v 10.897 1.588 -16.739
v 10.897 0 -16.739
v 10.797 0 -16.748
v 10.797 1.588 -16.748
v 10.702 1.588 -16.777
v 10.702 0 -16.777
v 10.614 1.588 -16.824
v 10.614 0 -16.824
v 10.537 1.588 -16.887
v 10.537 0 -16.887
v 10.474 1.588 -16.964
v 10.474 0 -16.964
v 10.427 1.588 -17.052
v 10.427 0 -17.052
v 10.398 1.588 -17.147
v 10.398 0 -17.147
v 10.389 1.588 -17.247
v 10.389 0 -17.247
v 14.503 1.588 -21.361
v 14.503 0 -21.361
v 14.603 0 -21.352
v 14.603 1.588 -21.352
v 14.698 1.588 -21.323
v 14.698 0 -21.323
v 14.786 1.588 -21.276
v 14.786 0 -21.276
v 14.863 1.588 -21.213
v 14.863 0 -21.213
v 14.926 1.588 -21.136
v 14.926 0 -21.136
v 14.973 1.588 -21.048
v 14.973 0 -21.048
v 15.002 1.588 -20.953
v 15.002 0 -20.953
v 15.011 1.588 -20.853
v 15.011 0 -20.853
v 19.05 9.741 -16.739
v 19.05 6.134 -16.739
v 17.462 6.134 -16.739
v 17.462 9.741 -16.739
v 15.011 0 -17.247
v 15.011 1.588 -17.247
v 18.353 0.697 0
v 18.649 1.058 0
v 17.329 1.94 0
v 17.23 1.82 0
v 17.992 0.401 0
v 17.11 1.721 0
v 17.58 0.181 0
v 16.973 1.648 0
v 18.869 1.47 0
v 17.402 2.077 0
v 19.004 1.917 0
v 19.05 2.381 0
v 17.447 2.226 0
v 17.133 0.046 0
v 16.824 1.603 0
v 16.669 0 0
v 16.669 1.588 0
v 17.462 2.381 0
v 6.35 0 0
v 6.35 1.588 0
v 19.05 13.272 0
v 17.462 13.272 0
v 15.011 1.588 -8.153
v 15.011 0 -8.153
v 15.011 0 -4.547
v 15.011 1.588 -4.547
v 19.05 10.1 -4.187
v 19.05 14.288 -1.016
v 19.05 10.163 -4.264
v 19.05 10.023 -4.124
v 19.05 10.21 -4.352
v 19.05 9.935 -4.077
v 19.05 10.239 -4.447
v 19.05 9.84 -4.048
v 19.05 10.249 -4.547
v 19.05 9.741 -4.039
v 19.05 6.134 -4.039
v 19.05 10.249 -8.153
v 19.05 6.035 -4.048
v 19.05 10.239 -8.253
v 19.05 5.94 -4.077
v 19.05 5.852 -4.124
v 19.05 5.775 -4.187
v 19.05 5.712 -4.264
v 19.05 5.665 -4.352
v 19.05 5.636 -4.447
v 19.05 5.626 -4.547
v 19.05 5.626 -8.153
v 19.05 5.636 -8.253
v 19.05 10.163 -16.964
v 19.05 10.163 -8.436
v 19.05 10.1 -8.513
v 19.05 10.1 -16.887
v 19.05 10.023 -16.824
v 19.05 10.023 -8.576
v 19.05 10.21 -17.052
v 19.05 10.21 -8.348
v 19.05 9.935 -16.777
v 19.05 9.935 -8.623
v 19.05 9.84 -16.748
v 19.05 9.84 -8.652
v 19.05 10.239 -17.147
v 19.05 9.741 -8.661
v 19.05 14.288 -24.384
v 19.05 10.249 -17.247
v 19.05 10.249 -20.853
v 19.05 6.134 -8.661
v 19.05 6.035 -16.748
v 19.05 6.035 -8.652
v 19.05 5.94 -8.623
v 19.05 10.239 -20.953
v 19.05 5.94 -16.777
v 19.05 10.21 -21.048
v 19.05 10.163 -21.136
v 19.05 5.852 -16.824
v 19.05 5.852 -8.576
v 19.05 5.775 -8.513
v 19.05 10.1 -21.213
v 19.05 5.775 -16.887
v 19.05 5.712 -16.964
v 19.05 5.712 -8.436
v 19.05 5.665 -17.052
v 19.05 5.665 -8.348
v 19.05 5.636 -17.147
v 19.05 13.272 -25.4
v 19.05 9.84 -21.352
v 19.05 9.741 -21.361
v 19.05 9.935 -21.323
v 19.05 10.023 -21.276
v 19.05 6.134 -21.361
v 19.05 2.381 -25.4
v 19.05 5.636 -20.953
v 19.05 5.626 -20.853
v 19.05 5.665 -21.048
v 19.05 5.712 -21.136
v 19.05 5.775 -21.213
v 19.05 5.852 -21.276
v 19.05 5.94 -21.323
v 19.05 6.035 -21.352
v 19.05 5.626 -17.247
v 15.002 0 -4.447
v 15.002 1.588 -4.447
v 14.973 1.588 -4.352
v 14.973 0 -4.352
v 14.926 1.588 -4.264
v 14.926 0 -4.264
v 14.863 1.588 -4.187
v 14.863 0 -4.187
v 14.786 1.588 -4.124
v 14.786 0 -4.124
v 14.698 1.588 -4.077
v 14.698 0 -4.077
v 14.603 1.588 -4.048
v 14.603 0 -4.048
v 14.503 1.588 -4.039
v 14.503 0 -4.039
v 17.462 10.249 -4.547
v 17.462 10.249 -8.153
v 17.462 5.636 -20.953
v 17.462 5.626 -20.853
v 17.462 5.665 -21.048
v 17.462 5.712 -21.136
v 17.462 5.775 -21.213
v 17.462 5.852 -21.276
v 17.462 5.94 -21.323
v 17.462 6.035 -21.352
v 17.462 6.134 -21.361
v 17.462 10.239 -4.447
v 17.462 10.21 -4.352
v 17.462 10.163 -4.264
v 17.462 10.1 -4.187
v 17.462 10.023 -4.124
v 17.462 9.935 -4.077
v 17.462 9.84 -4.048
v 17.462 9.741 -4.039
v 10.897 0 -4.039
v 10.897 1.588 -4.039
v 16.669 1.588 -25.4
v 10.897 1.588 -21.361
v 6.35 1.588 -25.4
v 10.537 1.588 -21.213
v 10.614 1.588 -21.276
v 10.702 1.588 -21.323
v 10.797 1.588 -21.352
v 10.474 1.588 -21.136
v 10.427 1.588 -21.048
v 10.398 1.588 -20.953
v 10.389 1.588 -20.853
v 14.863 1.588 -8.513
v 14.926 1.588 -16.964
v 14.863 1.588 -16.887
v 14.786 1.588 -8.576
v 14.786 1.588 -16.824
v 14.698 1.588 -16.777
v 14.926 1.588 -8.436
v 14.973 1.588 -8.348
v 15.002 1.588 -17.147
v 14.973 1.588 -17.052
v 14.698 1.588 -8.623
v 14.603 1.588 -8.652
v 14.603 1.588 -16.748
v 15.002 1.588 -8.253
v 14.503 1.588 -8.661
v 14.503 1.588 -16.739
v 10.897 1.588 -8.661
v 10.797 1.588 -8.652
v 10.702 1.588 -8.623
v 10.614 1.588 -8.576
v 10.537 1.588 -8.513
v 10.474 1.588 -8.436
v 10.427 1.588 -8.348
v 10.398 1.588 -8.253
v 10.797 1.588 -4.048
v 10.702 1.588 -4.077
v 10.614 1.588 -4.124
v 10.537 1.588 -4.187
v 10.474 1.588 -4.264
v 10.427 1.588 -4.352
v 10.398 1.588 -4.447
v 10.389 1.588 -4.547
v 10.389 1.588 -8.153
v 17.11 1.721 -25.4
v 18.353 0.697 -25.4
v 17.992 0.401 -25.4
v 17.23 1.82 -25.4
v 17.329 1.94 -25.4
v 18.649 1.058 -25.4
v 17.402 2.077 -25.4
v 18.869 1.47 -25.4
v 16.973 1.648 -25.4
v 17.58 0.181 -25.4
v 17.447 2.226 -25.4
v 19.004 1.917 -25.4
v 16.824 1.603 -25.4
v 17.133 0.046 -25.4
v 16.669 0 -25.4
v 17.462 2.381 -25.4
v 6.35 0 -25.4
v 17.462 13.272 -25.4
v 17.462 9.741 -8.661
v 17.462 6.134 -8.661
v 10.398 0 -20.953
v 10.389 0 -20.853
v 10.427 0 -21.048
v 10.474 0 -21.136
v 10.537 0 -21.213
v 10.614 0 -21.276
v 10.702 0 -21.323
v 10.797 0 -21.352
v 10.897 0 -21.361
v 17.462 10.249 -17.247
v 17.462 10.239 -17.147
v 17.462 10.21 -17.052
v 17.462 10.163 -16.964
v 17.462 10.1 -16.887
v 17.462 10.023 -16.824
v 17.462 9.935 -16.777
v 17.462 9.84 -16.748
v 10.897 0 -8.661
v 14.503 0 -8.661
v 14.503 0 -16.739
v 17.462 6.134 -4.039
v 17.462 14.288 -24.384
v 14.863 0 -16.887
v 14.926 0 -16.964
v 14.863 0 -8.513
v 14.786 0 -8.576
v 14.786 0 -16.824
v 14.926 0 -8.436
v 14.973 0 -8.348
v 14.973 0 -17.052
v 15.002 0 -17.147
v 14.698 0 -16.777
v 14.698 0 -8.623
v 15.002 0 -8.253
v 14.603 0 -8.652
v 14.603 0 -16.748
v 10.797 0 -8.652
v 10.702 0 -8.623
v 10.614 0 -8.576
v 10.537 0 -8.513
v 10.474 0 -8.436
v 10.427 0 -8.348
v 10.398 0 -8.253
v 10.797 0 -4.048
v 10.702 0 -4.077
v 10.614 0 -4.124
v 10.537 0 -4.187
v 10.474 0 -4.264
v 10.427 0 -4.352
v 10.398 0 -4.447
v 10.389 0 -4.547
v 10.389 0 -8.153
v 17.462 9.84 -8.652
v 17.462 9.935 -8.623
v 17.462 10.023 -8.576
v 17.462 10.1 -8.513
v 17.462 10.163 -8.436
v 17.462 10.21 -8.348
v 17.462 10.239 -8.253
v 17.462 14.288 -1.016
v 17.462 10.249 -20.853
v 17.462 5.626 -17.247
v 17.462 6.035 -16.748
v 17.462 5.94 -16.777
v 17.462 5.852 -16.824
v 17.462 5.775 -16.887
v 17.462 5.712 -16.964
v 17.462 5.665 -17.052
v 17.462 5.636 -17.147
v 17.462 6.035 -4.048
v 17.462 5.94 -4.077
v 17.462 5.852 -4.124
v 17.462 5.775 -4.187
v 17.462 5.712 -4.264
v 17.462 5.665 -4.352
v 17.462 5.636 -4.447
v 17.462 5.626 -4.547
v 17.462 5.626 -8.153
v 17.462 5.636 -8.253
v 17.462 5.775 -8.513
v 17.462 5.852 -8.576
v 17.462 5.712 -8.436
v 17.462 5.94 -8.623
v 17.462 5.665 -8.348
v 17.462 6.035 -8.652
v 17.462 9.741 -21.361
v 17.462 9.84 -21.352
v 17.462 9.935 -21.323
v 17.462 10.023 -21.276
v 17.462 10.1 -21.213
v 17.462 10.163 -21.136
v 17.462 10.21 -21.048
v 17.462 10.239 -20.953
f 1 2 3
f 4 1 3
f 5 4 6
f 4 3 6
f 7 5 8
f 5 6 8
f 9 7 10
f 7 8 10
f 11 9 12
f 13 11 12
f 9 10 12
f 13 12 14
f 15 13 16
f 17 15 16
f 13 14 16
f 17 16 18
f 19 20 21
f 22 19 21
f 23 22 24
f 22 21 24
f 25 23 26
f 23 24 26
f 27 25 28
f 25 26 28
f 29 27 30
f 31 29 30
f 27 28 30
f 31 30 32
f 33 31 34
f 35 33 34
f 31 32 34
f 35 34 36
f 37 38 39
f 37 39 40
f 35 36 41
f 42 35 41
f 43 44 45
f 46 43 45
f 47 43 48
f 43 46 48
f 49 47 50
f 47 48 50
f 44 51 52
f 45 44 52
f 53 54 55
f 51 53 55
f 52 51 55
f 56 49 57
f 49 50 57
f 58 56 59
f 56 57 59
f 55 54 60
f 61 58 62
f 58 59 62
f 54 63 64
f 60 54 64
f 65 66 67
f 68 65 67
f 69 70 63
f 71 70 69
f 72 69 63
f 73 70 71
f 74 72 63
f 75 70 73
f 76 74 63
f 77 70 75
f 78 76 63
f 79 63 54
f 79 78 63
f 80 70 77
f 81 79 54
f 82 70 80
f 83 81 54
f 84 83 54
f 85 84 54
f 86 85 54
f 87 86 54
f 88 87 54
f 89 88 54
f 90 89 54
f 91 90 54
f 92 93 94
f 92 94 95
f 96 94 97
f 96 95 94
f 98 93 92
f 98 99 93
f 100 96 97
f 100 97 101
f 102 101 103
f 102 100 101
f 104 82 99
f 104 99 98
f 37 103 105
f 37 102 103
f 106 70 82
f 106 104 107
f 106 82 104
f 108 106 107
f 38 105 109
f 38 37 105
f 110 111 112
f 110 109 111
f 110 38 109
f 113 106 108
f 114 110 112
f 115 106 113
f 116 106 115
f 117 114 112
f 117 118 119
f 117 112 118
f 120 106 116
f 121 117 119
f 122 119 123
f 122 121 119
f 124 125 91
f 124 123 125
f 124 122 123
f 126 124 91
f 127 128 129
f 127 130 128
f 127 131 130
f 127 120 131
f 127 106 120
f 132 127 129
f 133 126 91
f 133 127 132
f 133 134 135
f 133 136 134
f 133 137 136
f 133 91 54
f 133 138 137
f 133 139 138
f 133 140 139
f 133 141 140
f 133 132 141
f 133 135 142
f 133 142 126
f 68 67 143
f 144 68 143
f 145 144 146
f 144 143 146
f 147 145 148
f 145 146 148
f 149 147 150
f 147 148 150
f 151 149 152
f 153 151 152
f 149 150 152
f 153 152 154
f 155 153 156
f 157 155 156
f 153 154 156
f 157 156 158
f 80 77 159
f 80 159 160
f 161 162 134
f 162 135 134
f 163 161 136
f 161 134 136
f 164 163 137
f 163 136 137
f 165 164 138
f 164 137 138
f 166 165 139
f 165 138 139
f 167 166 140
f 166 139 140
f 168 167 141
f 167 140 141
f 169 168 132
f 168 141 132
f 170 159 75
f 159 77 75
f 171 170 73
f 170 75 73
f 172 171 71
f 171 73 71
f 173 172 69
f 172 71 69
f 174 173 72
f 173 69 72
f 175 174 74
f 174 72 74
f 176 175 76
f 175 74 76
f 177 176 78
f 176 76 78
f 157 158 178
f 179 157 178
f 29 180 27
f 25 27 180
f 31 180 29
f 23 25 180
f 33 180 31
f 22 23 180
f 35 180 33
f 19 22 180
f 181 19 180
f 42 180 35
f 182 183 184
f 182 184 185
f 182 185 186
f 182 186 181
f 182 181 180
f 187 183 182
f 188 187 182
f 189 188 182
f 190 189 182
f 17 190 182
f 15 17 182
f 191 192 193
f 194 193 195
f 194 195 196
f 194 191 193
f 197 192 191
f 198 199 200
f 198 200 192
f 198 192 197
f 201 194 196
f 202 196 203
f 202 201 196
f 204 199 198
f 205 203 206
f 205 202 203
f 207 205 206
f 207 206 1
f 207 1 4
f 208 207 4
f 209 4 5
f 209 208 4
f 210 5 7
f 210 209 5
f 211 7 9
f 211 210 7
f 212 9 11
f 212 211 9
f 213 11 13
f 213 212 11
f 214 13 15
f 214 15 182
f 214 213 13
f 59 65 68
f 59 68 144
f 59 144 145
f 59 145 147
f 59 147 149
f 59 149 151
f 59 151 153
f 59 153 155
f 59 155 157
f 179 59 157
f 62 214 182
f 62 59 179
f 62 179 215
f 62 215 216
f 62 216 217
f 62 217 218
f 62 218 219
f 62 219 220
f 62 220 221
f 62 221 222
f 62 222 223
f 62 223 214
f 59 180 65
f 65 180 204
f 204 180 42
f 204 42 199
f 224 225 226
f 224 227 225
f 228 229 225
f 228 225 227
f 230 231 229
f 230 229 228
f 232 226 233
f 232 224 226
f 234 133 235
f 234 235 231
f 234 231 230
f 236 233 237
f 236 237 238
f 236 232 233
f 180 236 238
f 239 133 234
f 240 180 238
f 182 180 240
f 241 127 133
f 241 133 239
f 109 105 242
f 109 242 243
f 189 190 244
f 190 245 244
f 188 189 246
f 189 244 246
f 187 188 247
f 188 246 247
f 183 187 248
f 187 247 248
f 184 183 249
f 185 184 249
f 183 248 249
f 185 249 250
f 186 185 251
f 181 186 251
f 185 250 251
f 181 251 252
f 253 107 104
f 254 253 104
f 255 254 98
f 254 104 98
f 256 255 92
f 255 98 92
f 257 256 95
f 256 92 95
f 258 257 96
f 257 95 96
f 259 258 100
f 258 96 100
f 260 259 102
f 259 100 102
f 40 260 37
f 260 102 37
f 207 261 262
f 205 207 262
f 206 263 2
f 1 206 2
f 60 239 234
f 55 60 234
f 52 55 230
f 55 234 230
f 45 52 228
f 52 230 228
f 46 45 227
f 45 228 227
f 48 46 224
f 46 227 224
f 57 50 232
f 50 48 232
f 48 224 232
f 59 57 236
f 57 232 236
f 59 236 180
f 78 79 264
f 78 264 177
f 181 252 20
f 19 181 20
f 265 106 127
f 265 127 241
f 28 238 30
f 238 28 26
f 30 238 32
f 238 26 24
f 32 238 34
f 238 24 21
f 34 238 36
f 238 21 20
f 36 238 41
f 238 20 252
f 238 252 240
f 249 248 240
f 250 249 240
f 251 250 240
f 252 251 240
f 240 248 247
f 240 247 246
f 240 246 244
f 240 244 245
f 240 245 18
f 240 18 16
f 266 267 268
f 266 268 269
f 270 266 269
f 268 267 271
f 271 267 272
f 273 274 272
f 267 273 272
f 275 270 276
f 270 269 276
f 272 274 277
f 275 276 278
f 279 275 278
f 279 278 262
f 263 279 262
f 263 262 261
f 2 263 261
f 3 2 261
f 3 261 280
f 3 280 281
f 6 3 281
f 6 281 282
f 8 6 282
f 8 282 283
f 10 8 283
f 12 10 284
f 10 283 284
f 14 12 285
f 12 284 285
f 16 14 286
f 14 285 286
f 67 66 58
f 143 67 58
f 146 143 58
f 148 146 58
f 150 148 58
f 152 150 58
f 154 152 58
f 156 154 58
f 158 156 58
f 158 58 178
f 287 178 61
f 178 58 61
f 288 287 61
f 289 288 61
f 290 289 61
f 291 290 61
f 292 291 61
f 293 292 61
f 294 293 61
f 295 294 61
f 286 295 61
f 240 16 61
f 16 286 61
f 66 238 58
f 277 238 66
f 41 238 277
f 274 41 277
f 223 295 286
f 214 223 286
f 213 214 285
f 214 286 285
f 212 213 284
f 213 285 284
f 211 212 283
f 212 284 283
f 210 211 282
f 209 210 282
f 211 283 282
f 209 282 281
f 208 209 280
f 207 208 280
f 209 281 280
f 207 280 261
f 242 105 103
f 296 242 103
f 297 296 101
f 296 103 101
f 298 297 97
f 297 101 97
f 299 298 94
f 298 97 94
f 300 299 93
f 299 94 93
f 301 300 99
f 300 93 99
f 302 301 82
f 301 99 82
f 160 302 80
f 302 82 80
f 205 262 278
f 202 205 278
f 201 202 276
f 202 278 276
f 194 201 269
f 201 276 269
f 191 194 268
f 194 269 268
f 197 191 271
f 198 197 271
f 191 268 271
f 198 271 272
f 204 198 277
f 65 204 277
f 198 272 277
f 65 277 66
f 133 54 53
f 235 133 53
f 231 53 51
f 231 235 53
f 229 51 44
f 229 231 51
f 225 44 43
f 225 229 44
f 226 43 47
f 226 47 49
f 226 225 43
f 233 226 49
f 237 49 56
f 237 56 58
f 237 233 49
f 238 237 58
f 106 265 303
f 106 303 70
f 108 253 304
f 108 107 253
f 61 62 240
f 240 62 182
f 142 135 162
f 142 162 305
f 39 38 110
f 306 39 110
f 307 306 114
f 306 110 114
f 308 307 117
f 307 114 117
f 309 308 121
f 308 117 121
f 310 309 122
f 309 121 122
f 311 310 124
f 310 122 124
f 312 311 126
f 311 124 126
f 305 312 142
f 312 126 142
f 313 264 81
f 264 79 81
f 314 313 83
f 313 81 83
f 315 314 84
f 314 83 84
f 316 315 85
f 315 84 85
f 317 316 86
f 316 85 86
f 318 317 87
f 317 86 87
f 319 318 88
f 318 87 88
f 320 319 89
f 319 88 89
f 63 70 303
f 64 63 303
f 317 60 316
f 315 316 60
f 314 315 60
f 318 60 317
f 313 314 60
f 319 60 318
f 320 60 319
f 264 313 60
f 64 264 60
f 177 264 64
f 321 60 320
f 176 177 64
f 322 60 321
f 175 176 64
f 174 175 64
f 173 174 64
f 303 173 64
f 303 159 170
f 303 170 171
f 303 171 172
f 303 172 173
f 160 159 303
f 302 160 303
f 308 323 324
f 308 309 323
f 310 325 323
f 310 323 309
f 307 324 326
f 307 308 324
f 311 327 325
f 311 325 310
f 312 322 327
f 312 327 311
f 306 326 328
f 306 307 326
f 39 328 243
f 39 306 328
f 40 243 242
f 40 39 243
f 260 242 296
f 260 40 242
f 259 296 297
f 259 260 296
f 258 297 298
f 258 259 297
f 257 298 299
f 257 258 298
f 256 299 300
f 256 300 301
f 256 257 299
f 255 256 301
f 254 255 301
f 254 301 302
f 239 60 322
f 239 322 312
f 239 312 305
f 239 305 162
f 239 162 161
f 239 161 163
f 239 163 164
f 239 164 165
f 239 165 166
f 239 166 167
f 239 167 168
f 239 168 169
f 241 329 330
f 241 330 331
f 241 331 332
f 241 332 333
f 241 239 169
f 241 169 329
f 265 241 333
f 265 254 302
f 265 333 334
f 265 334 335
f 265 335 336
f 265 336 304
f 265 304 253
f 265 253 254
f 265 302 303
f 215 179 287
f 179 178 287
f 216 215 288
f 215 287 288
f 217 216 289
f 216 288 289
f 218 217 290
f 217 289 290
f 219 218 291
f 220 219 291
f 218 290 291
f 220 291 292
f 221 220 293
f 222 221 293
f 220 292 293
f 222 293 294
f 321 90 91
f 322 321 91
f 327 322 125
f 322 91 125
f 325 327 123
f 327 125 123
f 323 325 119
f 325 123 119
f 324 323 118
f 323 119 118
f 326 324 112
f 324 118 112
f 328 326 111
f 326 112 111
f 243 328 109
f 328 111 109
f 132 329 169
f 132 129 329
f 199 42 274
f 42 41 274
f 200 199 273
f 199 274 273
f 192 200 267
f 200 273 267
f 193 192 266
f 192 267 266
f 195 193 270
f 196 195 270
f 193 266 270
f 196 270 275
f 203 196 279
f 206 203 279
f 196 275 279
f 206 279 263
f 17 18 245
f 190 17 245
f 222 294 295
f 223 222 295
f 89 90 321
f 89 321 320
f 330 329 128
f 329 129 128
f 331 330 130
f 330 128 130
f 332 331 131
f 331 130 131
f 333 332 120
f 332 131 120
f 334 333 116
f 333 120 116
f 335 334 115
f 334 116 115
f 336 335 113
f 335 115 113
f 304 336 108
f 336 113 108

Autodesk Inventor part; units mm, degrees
ref_plane "YZ Plane" through (0, 0, 0) normal (1, 0, 0) x (0, 1, 0)
ref_plane "XZ Plane" through (0, 0, 0) normal (0, 1, 0) x (-1, 0, 0)
sketch "Sketch1" plane through (0, 0, 0) normal (0, 1, 0) x (-1, 0, 0)
  line L0 (-19.05, 0) -> (19.05, 0)
  line L1 (19.05, 0) -> (19.05, -25.4)
  line L2 (19.05, -25.4) -> (-19.05, -25.4)
  line L3 (-19.05, -25.4) -> (-19.05, 0)
  line L4 (19.05, 0) -> (-19.05, -25.4) construction
  point P0 (0, 0)
  point P1 (0, 0)
  dimension "d0" = 38.1
  dimension "d1" = 25.4
extrude "Plate1" add sketch "Sketch1" along normal blind 1.5875
sketch "Sketch2" plane through (17.4625, 0, -25.4) normal (1, 0, 0) x (0, 1, 0)
  line L0 (0, 25.4) -> (0, 0)
  line L1 (0, 0) -> (14.2875, 0)
  line L2 (14.2875, 0) -> (14.2875, 25.4)
  line L3 (14.2875, 25.4) -> (0, 25.4)
edge flange "Flanges" height 12.7 angle 90 thickness 1.5875 bend radius 0.7937 thickness toward (1, 0, 0) relief tear relief width 1.5875 relief depth 0.7937 corner gap 1.5875 corner form 0 edges at (19.05, 1.5875, -12.7) (-19.05, 1.5875, -12.7) wall of the first edge with corners at (17.4625, 0, 0) (17.4625, 0, -25.4) (17.4625, 14.2875, -25.4) (17.4625, 14.2875, 0)
bend "Bend1"
corner "Corner1"
sketch "Sketch3" plane through (19.05, 2.3813, -25.4) normal (1, 0, 0) x (0, 0, -1)
  line L0 (-20.8534, 7.8677) -> (-17.2466, 7.8677)
  line L1 (-16.7386, 7.3597) -> (-16.7386, 3.7529)
  line L2 (-17.2466, 3.2449) -> (-20.8534, 3.2449)
  line L3 (-21.3614, 3.7529) -> (-21.3614, 7.3597)
  arc A0 (-20.8534, 7.8677) -> (-21.3614, 7.3597) centre (-20.8534, 7.3597) ccw
  arc A1 (-16.7386, 7.3597) -> (-17.2466, 7.8677) centre (-17.2466, 7.3597) ccw
  arc A2 (-17.2466, 3.2449) -> (-16.7386, 3.7529) centre (-17.2466, 3.7529) ccw
  arc A3 (-21.3614, 3.7529) -> (-20.8534, 3.2449) centre (-20.8534, 3.7529) ccw
  line L4 (-25.4, 0) -> (-25.4, 11.9063) construction
  line L5 (-25.4, 11.9063) -> (0, 11.9062) construction
  line L6 (-20.8534, 7.3597) -> (-17.2466, 3.7529) construction
  point P0 (-25.4, -2.3812)
  point P1 (-16.7386, 3.2449)
  point P2 (-21.3614, 3.2449)
  point P3 (-19.05, 5.5563)
  dimension "d16" = 4.6228
  dimension "d17" = 0.508
  dimension "d20" = 6.35
  dimension "d21" = 6.35
extrude "Flange Stamp" cut sketch "Sketch3" against normal blind 1.5875
sketch "Sketch7" plane through (19.05, 2.3813, 0) normal (1, 0, 0) x (0, 0, -1)
  arc A0 (4.5466, 7.8677) -> (4.0386, 7.3597) centre (4.5466, 7.3597) ccw construction
  arc A1 (8.1534, 3.2449) -> (8.6614, 3.7529) centre (8.1534, 3.7529) ccw construction
  circle A2 centre (6.35, 5.5563) radius 2.1844
  line L0 (4.5466, 7.3597) -> (8.1534, 3.7529) construction
  point P0 (0, -2.3812)
  dimension "d46" = 4.3688
surface extrude "Flange Circle" sketch "Sketch7" against normal up to surface (1.5875 mm away) shown yes curves A2
ref_plane "Flange Pattern Plane" through (19.05, 7.9375, -4.5466) normal (0, 1, 0) x (1, 0, 0)
sketch "Flange Pattern Sketch" plane through (19.05, 7.9375, -4.5466) normal (0, 1, 0) x (1, 0, 0)
  line L0 (0, 3.6068) -> (0, 0) construction
  line L1 (-45.8186, -4.5466) -> (8.2118, -4.5466) construction
  line L2 (0, 0) -> (-1.5875, 0) construction
  point P0 (-19.05, -4.5466)
  point P1 (0, 1.8034)
  point P2 (0, 14.5034)
  dimension "d131" = 12.7
  dimension "d134" = 12.7
pattern_sketch "Flange Pattern" of "Flange Circle", "Flange Stamp" from (19.05, 7.9375, -6.35) copies at (19.05, 7.9375, -19.05)
sketch "Sketch8" plane through (0, 0, 0) normal (0, -1, 0) x (1, 0, 0)
  line L0 (16.6687, 0) -> (-16.6687, 0) construction
  line L1 (14.5034, -4.0386) -> (10.8966, -4.0386)
  line L2 (10.3886, -4.5466) -> (10.3886, -8.1534)
  line L3 (10.8966, -8.6614) -> (14.5034, -8.6614)
  line L4 (15.0114, -8.1534) -> (15.0114, -4.5466)
  arc A0 (15.0114, -4.5466) -> (14.5034, -4.0386) centre (14.5034, -4.5466) ccw
  arc A1 (14.5034, -8.6614) -> (15.0114, -8.1534) centre (14.5034, -8.1534) ccw
  arc A2 (10.3886, -8.1534) -> (10.8966, -8.6614) centre (10.8966, -8.1534) ccw
  arc A3 (10.8966, -4.0386) -> (10.3886, -4.5466) centre (10.8966, -4.5466) ccw
  line L5 (14.5034, -4.5466) -> (10.8966, -8.1534) construction
  line L6 (19.05, 0) -> (19.05, -25.4) construction
  point P0 (0, 0)
  point P1 (10.3886, -8.6614)
  point P2 (15.0114, -8.6614)
  point P3 (12.7, -6.35)
  dimension "d49" = 4.6228
  dimension "d50" = 0.508
  dimension "d51" = 6.35
  dimension "d52" = 6.35
extrude "Body Stamp" cut sketch "Sketch8" against normal blind 1.5875
sketch "Sketch9" plane through (0, 0, 0) normal (0, -1, 0) x (1, 0, 0)
  arc A0 (15.0114, -4.5466) -> (14.5034, -4.0386) centre (14.5034, -4.5466) ccw construction
  arc A1 (10.3886, -8.1534) -> (10.8966, -8.6614) centre (10.8966, -8.1534) ccw construction
  line L0 (14.5034, -4.5466) -> (10.8966, -8.1534) construction
  circle A2 centre (12.7, -6.35) radius 2.1844
  point P0 (0, 0)
  dimension "d55" = 4.3688
surface extrude "Body Circle" sketch "Sketch9" against normal up to surface (1.5875 mm away) shown yes curves A2
sketch "Body Pattern Sketch" plane through (0, 0, 0) normal (0, -1, 0) x (1, 0, 0)
  line L0 (16.6687, 0) -> (-16.6687, 0) construction
  line L1 (19.05, 0) -> (19.05, -25.4) construction
  circle A0 centre (12.7, -6.35) radius 2.1844 construction
  point P0 (0, 0)
  point P1 (12.7, -19.05)
  dimension "d62" = 12.7
  dimension "d65" = 12.7
  dimension "d139" = 12.7
pattern_sketch "Body Pattern" of "Body Stamp", "Body Circle" from (12.7, 0, -6.35) copies at (12.7, 0, -19.05)
sketch "Arc Length" plane through (17.4625, 2.3813, 0) normal (0, 0, 1) x (1, 0, 0)
  line L0 (0, 0) -> (1.5875, 0) construction
  arc A0 (-0.7937, -0.7938) -> (0, 0) centre (-0.7937, 0) ccw construction
  line L1 (-0.7938, -2.3813) -> (-0.7937, -0.7938) construction
  arc A1 (-0.7938, -2.3813) -> (1.5875, 0) centre (-0.7937, 0) ccw construction
  point P0 (-17.4625, -2.3812)
  dimension "d85" = 3.7405
  dimension "d92" = 1.2468
sketch "Sketch13" plane through (19.05, 14.2875, 0) normal (1, 0, 0) x (0, 0, -1)
  line L0 (0, 0) -> (25.4, 0) construction
  line L1 (62.4078, 0) -> (63.4238, -1.016)
  line L2 (63.4238, -1.016) -> (64.4398, 0)
  line L3 (62.4078, 0) -> (64.4398, 0)
  line L4 (25.4, -11.9062) -> (0, -11.9062) construction
  line L5 (63.4238, -10.8903) -> (61.161, -13.1531)
  line L6 (61.161, -13.1531) -> (63.4238, -15.4159)
  line L7 (63.4238, -15.4159) -> (65.6866, -13.1531)
  line L8 (65.6866, -13.1531) -> (63.4238, -10.8903)
  line L9 (63.4238, -10.8903) -> (63.4238, -15.4159) construction
  line L10 (63.4238, -1.016) -> (63.4238, -10.8903) construction
  line L11 (0, -11.9062) -> (25.4, -11.9062) construction
  point P0 (0, -14.2875)
  dimension "d86" = 4.5256
  dimension "d88" = 1.016
  dimension "d91" = 1.016
  dimension "d102" = 63.4238
feature "Notch" [suppressed]
mirror "Notch Mirror" [suppressed]
pattern_linear "Notch Pattern" [suppressed]
chamfer "End Chamfer" distance 1.016 angle 45 4 edges at (-18.2562, 14.2875, -25.4) (18.2563, 14.2875, -25.4) (-18.2562, 14.2875, 0) (18.2562, 14.2875, 0)
sketch "Sketch14" plane through (-19.05, 2.3813, 419.1) normal (1, 0, 0) x (0, 0, -1)
  line L0 (419.1, 11.9063) -> (444.5, 11.9063) construction
  line L1 (419.1, 0) -> (419.1, 11.9063) construction
  line L2 (419.1, -2.3813) -> (444.5, -2.3813) construction
  line L3 (419.1, 11.9063) -> (444.5, 11.9063)
  line L4 (444.5, 11.9063) -> (444.5, -2.3813)
  line L5 (444.5, -2.3813) -> (419.1, -2.3813)
  line L6 (419.1, -2.3813) -> (419.1, 11.9063)
  point P0 (419.1, -2.3812)
  point P1 (382.0521, -1.9844)
extrude "Half Cut" cut sketch "Sketch14" along normal blind 25.4
equation "\"d1\" = 12.7 * Length"
equation "\"d18\" = Thickness"
equation "\"d53\" = Thickness"
equation "\"d89\" = Thickness"
equation "\"d2\" = Thickness"
equation "\"d3\" = BendReliefWidth"
equation "\"d4\" = BendReliefDepth"
equation "\"d5\" = MinimumRemnant"
equation "\"d6\" = TransitionRadius"
equation "\"d10\" = CornerReliefSize"
equation "\"d11\" = GapSize"
equation "\"d12\" = JacobiRadiusSize"
equation "\"BendRadius\" = Thickness"
equation "\"BendReliefWidth\" = Thickness"
equation "\"BendReliefDepth\" = 0.5 * Thickness"
equation "\"CornerReliefSize\" = 4 * Thickness"
equation "\"MinimumRemnant\" = 2 * Thickness"
equation "\"TransitionRadius\" = BendRadius"
equation "\"JacobiRadiusSize\" = BendRadius"
equation "\"GapSize\" = Thickness"
equation "\"Length\" = 2"
equation "\"Thickness\" = 1.5875"
properties part number "Alu C 1x3x1x35"
